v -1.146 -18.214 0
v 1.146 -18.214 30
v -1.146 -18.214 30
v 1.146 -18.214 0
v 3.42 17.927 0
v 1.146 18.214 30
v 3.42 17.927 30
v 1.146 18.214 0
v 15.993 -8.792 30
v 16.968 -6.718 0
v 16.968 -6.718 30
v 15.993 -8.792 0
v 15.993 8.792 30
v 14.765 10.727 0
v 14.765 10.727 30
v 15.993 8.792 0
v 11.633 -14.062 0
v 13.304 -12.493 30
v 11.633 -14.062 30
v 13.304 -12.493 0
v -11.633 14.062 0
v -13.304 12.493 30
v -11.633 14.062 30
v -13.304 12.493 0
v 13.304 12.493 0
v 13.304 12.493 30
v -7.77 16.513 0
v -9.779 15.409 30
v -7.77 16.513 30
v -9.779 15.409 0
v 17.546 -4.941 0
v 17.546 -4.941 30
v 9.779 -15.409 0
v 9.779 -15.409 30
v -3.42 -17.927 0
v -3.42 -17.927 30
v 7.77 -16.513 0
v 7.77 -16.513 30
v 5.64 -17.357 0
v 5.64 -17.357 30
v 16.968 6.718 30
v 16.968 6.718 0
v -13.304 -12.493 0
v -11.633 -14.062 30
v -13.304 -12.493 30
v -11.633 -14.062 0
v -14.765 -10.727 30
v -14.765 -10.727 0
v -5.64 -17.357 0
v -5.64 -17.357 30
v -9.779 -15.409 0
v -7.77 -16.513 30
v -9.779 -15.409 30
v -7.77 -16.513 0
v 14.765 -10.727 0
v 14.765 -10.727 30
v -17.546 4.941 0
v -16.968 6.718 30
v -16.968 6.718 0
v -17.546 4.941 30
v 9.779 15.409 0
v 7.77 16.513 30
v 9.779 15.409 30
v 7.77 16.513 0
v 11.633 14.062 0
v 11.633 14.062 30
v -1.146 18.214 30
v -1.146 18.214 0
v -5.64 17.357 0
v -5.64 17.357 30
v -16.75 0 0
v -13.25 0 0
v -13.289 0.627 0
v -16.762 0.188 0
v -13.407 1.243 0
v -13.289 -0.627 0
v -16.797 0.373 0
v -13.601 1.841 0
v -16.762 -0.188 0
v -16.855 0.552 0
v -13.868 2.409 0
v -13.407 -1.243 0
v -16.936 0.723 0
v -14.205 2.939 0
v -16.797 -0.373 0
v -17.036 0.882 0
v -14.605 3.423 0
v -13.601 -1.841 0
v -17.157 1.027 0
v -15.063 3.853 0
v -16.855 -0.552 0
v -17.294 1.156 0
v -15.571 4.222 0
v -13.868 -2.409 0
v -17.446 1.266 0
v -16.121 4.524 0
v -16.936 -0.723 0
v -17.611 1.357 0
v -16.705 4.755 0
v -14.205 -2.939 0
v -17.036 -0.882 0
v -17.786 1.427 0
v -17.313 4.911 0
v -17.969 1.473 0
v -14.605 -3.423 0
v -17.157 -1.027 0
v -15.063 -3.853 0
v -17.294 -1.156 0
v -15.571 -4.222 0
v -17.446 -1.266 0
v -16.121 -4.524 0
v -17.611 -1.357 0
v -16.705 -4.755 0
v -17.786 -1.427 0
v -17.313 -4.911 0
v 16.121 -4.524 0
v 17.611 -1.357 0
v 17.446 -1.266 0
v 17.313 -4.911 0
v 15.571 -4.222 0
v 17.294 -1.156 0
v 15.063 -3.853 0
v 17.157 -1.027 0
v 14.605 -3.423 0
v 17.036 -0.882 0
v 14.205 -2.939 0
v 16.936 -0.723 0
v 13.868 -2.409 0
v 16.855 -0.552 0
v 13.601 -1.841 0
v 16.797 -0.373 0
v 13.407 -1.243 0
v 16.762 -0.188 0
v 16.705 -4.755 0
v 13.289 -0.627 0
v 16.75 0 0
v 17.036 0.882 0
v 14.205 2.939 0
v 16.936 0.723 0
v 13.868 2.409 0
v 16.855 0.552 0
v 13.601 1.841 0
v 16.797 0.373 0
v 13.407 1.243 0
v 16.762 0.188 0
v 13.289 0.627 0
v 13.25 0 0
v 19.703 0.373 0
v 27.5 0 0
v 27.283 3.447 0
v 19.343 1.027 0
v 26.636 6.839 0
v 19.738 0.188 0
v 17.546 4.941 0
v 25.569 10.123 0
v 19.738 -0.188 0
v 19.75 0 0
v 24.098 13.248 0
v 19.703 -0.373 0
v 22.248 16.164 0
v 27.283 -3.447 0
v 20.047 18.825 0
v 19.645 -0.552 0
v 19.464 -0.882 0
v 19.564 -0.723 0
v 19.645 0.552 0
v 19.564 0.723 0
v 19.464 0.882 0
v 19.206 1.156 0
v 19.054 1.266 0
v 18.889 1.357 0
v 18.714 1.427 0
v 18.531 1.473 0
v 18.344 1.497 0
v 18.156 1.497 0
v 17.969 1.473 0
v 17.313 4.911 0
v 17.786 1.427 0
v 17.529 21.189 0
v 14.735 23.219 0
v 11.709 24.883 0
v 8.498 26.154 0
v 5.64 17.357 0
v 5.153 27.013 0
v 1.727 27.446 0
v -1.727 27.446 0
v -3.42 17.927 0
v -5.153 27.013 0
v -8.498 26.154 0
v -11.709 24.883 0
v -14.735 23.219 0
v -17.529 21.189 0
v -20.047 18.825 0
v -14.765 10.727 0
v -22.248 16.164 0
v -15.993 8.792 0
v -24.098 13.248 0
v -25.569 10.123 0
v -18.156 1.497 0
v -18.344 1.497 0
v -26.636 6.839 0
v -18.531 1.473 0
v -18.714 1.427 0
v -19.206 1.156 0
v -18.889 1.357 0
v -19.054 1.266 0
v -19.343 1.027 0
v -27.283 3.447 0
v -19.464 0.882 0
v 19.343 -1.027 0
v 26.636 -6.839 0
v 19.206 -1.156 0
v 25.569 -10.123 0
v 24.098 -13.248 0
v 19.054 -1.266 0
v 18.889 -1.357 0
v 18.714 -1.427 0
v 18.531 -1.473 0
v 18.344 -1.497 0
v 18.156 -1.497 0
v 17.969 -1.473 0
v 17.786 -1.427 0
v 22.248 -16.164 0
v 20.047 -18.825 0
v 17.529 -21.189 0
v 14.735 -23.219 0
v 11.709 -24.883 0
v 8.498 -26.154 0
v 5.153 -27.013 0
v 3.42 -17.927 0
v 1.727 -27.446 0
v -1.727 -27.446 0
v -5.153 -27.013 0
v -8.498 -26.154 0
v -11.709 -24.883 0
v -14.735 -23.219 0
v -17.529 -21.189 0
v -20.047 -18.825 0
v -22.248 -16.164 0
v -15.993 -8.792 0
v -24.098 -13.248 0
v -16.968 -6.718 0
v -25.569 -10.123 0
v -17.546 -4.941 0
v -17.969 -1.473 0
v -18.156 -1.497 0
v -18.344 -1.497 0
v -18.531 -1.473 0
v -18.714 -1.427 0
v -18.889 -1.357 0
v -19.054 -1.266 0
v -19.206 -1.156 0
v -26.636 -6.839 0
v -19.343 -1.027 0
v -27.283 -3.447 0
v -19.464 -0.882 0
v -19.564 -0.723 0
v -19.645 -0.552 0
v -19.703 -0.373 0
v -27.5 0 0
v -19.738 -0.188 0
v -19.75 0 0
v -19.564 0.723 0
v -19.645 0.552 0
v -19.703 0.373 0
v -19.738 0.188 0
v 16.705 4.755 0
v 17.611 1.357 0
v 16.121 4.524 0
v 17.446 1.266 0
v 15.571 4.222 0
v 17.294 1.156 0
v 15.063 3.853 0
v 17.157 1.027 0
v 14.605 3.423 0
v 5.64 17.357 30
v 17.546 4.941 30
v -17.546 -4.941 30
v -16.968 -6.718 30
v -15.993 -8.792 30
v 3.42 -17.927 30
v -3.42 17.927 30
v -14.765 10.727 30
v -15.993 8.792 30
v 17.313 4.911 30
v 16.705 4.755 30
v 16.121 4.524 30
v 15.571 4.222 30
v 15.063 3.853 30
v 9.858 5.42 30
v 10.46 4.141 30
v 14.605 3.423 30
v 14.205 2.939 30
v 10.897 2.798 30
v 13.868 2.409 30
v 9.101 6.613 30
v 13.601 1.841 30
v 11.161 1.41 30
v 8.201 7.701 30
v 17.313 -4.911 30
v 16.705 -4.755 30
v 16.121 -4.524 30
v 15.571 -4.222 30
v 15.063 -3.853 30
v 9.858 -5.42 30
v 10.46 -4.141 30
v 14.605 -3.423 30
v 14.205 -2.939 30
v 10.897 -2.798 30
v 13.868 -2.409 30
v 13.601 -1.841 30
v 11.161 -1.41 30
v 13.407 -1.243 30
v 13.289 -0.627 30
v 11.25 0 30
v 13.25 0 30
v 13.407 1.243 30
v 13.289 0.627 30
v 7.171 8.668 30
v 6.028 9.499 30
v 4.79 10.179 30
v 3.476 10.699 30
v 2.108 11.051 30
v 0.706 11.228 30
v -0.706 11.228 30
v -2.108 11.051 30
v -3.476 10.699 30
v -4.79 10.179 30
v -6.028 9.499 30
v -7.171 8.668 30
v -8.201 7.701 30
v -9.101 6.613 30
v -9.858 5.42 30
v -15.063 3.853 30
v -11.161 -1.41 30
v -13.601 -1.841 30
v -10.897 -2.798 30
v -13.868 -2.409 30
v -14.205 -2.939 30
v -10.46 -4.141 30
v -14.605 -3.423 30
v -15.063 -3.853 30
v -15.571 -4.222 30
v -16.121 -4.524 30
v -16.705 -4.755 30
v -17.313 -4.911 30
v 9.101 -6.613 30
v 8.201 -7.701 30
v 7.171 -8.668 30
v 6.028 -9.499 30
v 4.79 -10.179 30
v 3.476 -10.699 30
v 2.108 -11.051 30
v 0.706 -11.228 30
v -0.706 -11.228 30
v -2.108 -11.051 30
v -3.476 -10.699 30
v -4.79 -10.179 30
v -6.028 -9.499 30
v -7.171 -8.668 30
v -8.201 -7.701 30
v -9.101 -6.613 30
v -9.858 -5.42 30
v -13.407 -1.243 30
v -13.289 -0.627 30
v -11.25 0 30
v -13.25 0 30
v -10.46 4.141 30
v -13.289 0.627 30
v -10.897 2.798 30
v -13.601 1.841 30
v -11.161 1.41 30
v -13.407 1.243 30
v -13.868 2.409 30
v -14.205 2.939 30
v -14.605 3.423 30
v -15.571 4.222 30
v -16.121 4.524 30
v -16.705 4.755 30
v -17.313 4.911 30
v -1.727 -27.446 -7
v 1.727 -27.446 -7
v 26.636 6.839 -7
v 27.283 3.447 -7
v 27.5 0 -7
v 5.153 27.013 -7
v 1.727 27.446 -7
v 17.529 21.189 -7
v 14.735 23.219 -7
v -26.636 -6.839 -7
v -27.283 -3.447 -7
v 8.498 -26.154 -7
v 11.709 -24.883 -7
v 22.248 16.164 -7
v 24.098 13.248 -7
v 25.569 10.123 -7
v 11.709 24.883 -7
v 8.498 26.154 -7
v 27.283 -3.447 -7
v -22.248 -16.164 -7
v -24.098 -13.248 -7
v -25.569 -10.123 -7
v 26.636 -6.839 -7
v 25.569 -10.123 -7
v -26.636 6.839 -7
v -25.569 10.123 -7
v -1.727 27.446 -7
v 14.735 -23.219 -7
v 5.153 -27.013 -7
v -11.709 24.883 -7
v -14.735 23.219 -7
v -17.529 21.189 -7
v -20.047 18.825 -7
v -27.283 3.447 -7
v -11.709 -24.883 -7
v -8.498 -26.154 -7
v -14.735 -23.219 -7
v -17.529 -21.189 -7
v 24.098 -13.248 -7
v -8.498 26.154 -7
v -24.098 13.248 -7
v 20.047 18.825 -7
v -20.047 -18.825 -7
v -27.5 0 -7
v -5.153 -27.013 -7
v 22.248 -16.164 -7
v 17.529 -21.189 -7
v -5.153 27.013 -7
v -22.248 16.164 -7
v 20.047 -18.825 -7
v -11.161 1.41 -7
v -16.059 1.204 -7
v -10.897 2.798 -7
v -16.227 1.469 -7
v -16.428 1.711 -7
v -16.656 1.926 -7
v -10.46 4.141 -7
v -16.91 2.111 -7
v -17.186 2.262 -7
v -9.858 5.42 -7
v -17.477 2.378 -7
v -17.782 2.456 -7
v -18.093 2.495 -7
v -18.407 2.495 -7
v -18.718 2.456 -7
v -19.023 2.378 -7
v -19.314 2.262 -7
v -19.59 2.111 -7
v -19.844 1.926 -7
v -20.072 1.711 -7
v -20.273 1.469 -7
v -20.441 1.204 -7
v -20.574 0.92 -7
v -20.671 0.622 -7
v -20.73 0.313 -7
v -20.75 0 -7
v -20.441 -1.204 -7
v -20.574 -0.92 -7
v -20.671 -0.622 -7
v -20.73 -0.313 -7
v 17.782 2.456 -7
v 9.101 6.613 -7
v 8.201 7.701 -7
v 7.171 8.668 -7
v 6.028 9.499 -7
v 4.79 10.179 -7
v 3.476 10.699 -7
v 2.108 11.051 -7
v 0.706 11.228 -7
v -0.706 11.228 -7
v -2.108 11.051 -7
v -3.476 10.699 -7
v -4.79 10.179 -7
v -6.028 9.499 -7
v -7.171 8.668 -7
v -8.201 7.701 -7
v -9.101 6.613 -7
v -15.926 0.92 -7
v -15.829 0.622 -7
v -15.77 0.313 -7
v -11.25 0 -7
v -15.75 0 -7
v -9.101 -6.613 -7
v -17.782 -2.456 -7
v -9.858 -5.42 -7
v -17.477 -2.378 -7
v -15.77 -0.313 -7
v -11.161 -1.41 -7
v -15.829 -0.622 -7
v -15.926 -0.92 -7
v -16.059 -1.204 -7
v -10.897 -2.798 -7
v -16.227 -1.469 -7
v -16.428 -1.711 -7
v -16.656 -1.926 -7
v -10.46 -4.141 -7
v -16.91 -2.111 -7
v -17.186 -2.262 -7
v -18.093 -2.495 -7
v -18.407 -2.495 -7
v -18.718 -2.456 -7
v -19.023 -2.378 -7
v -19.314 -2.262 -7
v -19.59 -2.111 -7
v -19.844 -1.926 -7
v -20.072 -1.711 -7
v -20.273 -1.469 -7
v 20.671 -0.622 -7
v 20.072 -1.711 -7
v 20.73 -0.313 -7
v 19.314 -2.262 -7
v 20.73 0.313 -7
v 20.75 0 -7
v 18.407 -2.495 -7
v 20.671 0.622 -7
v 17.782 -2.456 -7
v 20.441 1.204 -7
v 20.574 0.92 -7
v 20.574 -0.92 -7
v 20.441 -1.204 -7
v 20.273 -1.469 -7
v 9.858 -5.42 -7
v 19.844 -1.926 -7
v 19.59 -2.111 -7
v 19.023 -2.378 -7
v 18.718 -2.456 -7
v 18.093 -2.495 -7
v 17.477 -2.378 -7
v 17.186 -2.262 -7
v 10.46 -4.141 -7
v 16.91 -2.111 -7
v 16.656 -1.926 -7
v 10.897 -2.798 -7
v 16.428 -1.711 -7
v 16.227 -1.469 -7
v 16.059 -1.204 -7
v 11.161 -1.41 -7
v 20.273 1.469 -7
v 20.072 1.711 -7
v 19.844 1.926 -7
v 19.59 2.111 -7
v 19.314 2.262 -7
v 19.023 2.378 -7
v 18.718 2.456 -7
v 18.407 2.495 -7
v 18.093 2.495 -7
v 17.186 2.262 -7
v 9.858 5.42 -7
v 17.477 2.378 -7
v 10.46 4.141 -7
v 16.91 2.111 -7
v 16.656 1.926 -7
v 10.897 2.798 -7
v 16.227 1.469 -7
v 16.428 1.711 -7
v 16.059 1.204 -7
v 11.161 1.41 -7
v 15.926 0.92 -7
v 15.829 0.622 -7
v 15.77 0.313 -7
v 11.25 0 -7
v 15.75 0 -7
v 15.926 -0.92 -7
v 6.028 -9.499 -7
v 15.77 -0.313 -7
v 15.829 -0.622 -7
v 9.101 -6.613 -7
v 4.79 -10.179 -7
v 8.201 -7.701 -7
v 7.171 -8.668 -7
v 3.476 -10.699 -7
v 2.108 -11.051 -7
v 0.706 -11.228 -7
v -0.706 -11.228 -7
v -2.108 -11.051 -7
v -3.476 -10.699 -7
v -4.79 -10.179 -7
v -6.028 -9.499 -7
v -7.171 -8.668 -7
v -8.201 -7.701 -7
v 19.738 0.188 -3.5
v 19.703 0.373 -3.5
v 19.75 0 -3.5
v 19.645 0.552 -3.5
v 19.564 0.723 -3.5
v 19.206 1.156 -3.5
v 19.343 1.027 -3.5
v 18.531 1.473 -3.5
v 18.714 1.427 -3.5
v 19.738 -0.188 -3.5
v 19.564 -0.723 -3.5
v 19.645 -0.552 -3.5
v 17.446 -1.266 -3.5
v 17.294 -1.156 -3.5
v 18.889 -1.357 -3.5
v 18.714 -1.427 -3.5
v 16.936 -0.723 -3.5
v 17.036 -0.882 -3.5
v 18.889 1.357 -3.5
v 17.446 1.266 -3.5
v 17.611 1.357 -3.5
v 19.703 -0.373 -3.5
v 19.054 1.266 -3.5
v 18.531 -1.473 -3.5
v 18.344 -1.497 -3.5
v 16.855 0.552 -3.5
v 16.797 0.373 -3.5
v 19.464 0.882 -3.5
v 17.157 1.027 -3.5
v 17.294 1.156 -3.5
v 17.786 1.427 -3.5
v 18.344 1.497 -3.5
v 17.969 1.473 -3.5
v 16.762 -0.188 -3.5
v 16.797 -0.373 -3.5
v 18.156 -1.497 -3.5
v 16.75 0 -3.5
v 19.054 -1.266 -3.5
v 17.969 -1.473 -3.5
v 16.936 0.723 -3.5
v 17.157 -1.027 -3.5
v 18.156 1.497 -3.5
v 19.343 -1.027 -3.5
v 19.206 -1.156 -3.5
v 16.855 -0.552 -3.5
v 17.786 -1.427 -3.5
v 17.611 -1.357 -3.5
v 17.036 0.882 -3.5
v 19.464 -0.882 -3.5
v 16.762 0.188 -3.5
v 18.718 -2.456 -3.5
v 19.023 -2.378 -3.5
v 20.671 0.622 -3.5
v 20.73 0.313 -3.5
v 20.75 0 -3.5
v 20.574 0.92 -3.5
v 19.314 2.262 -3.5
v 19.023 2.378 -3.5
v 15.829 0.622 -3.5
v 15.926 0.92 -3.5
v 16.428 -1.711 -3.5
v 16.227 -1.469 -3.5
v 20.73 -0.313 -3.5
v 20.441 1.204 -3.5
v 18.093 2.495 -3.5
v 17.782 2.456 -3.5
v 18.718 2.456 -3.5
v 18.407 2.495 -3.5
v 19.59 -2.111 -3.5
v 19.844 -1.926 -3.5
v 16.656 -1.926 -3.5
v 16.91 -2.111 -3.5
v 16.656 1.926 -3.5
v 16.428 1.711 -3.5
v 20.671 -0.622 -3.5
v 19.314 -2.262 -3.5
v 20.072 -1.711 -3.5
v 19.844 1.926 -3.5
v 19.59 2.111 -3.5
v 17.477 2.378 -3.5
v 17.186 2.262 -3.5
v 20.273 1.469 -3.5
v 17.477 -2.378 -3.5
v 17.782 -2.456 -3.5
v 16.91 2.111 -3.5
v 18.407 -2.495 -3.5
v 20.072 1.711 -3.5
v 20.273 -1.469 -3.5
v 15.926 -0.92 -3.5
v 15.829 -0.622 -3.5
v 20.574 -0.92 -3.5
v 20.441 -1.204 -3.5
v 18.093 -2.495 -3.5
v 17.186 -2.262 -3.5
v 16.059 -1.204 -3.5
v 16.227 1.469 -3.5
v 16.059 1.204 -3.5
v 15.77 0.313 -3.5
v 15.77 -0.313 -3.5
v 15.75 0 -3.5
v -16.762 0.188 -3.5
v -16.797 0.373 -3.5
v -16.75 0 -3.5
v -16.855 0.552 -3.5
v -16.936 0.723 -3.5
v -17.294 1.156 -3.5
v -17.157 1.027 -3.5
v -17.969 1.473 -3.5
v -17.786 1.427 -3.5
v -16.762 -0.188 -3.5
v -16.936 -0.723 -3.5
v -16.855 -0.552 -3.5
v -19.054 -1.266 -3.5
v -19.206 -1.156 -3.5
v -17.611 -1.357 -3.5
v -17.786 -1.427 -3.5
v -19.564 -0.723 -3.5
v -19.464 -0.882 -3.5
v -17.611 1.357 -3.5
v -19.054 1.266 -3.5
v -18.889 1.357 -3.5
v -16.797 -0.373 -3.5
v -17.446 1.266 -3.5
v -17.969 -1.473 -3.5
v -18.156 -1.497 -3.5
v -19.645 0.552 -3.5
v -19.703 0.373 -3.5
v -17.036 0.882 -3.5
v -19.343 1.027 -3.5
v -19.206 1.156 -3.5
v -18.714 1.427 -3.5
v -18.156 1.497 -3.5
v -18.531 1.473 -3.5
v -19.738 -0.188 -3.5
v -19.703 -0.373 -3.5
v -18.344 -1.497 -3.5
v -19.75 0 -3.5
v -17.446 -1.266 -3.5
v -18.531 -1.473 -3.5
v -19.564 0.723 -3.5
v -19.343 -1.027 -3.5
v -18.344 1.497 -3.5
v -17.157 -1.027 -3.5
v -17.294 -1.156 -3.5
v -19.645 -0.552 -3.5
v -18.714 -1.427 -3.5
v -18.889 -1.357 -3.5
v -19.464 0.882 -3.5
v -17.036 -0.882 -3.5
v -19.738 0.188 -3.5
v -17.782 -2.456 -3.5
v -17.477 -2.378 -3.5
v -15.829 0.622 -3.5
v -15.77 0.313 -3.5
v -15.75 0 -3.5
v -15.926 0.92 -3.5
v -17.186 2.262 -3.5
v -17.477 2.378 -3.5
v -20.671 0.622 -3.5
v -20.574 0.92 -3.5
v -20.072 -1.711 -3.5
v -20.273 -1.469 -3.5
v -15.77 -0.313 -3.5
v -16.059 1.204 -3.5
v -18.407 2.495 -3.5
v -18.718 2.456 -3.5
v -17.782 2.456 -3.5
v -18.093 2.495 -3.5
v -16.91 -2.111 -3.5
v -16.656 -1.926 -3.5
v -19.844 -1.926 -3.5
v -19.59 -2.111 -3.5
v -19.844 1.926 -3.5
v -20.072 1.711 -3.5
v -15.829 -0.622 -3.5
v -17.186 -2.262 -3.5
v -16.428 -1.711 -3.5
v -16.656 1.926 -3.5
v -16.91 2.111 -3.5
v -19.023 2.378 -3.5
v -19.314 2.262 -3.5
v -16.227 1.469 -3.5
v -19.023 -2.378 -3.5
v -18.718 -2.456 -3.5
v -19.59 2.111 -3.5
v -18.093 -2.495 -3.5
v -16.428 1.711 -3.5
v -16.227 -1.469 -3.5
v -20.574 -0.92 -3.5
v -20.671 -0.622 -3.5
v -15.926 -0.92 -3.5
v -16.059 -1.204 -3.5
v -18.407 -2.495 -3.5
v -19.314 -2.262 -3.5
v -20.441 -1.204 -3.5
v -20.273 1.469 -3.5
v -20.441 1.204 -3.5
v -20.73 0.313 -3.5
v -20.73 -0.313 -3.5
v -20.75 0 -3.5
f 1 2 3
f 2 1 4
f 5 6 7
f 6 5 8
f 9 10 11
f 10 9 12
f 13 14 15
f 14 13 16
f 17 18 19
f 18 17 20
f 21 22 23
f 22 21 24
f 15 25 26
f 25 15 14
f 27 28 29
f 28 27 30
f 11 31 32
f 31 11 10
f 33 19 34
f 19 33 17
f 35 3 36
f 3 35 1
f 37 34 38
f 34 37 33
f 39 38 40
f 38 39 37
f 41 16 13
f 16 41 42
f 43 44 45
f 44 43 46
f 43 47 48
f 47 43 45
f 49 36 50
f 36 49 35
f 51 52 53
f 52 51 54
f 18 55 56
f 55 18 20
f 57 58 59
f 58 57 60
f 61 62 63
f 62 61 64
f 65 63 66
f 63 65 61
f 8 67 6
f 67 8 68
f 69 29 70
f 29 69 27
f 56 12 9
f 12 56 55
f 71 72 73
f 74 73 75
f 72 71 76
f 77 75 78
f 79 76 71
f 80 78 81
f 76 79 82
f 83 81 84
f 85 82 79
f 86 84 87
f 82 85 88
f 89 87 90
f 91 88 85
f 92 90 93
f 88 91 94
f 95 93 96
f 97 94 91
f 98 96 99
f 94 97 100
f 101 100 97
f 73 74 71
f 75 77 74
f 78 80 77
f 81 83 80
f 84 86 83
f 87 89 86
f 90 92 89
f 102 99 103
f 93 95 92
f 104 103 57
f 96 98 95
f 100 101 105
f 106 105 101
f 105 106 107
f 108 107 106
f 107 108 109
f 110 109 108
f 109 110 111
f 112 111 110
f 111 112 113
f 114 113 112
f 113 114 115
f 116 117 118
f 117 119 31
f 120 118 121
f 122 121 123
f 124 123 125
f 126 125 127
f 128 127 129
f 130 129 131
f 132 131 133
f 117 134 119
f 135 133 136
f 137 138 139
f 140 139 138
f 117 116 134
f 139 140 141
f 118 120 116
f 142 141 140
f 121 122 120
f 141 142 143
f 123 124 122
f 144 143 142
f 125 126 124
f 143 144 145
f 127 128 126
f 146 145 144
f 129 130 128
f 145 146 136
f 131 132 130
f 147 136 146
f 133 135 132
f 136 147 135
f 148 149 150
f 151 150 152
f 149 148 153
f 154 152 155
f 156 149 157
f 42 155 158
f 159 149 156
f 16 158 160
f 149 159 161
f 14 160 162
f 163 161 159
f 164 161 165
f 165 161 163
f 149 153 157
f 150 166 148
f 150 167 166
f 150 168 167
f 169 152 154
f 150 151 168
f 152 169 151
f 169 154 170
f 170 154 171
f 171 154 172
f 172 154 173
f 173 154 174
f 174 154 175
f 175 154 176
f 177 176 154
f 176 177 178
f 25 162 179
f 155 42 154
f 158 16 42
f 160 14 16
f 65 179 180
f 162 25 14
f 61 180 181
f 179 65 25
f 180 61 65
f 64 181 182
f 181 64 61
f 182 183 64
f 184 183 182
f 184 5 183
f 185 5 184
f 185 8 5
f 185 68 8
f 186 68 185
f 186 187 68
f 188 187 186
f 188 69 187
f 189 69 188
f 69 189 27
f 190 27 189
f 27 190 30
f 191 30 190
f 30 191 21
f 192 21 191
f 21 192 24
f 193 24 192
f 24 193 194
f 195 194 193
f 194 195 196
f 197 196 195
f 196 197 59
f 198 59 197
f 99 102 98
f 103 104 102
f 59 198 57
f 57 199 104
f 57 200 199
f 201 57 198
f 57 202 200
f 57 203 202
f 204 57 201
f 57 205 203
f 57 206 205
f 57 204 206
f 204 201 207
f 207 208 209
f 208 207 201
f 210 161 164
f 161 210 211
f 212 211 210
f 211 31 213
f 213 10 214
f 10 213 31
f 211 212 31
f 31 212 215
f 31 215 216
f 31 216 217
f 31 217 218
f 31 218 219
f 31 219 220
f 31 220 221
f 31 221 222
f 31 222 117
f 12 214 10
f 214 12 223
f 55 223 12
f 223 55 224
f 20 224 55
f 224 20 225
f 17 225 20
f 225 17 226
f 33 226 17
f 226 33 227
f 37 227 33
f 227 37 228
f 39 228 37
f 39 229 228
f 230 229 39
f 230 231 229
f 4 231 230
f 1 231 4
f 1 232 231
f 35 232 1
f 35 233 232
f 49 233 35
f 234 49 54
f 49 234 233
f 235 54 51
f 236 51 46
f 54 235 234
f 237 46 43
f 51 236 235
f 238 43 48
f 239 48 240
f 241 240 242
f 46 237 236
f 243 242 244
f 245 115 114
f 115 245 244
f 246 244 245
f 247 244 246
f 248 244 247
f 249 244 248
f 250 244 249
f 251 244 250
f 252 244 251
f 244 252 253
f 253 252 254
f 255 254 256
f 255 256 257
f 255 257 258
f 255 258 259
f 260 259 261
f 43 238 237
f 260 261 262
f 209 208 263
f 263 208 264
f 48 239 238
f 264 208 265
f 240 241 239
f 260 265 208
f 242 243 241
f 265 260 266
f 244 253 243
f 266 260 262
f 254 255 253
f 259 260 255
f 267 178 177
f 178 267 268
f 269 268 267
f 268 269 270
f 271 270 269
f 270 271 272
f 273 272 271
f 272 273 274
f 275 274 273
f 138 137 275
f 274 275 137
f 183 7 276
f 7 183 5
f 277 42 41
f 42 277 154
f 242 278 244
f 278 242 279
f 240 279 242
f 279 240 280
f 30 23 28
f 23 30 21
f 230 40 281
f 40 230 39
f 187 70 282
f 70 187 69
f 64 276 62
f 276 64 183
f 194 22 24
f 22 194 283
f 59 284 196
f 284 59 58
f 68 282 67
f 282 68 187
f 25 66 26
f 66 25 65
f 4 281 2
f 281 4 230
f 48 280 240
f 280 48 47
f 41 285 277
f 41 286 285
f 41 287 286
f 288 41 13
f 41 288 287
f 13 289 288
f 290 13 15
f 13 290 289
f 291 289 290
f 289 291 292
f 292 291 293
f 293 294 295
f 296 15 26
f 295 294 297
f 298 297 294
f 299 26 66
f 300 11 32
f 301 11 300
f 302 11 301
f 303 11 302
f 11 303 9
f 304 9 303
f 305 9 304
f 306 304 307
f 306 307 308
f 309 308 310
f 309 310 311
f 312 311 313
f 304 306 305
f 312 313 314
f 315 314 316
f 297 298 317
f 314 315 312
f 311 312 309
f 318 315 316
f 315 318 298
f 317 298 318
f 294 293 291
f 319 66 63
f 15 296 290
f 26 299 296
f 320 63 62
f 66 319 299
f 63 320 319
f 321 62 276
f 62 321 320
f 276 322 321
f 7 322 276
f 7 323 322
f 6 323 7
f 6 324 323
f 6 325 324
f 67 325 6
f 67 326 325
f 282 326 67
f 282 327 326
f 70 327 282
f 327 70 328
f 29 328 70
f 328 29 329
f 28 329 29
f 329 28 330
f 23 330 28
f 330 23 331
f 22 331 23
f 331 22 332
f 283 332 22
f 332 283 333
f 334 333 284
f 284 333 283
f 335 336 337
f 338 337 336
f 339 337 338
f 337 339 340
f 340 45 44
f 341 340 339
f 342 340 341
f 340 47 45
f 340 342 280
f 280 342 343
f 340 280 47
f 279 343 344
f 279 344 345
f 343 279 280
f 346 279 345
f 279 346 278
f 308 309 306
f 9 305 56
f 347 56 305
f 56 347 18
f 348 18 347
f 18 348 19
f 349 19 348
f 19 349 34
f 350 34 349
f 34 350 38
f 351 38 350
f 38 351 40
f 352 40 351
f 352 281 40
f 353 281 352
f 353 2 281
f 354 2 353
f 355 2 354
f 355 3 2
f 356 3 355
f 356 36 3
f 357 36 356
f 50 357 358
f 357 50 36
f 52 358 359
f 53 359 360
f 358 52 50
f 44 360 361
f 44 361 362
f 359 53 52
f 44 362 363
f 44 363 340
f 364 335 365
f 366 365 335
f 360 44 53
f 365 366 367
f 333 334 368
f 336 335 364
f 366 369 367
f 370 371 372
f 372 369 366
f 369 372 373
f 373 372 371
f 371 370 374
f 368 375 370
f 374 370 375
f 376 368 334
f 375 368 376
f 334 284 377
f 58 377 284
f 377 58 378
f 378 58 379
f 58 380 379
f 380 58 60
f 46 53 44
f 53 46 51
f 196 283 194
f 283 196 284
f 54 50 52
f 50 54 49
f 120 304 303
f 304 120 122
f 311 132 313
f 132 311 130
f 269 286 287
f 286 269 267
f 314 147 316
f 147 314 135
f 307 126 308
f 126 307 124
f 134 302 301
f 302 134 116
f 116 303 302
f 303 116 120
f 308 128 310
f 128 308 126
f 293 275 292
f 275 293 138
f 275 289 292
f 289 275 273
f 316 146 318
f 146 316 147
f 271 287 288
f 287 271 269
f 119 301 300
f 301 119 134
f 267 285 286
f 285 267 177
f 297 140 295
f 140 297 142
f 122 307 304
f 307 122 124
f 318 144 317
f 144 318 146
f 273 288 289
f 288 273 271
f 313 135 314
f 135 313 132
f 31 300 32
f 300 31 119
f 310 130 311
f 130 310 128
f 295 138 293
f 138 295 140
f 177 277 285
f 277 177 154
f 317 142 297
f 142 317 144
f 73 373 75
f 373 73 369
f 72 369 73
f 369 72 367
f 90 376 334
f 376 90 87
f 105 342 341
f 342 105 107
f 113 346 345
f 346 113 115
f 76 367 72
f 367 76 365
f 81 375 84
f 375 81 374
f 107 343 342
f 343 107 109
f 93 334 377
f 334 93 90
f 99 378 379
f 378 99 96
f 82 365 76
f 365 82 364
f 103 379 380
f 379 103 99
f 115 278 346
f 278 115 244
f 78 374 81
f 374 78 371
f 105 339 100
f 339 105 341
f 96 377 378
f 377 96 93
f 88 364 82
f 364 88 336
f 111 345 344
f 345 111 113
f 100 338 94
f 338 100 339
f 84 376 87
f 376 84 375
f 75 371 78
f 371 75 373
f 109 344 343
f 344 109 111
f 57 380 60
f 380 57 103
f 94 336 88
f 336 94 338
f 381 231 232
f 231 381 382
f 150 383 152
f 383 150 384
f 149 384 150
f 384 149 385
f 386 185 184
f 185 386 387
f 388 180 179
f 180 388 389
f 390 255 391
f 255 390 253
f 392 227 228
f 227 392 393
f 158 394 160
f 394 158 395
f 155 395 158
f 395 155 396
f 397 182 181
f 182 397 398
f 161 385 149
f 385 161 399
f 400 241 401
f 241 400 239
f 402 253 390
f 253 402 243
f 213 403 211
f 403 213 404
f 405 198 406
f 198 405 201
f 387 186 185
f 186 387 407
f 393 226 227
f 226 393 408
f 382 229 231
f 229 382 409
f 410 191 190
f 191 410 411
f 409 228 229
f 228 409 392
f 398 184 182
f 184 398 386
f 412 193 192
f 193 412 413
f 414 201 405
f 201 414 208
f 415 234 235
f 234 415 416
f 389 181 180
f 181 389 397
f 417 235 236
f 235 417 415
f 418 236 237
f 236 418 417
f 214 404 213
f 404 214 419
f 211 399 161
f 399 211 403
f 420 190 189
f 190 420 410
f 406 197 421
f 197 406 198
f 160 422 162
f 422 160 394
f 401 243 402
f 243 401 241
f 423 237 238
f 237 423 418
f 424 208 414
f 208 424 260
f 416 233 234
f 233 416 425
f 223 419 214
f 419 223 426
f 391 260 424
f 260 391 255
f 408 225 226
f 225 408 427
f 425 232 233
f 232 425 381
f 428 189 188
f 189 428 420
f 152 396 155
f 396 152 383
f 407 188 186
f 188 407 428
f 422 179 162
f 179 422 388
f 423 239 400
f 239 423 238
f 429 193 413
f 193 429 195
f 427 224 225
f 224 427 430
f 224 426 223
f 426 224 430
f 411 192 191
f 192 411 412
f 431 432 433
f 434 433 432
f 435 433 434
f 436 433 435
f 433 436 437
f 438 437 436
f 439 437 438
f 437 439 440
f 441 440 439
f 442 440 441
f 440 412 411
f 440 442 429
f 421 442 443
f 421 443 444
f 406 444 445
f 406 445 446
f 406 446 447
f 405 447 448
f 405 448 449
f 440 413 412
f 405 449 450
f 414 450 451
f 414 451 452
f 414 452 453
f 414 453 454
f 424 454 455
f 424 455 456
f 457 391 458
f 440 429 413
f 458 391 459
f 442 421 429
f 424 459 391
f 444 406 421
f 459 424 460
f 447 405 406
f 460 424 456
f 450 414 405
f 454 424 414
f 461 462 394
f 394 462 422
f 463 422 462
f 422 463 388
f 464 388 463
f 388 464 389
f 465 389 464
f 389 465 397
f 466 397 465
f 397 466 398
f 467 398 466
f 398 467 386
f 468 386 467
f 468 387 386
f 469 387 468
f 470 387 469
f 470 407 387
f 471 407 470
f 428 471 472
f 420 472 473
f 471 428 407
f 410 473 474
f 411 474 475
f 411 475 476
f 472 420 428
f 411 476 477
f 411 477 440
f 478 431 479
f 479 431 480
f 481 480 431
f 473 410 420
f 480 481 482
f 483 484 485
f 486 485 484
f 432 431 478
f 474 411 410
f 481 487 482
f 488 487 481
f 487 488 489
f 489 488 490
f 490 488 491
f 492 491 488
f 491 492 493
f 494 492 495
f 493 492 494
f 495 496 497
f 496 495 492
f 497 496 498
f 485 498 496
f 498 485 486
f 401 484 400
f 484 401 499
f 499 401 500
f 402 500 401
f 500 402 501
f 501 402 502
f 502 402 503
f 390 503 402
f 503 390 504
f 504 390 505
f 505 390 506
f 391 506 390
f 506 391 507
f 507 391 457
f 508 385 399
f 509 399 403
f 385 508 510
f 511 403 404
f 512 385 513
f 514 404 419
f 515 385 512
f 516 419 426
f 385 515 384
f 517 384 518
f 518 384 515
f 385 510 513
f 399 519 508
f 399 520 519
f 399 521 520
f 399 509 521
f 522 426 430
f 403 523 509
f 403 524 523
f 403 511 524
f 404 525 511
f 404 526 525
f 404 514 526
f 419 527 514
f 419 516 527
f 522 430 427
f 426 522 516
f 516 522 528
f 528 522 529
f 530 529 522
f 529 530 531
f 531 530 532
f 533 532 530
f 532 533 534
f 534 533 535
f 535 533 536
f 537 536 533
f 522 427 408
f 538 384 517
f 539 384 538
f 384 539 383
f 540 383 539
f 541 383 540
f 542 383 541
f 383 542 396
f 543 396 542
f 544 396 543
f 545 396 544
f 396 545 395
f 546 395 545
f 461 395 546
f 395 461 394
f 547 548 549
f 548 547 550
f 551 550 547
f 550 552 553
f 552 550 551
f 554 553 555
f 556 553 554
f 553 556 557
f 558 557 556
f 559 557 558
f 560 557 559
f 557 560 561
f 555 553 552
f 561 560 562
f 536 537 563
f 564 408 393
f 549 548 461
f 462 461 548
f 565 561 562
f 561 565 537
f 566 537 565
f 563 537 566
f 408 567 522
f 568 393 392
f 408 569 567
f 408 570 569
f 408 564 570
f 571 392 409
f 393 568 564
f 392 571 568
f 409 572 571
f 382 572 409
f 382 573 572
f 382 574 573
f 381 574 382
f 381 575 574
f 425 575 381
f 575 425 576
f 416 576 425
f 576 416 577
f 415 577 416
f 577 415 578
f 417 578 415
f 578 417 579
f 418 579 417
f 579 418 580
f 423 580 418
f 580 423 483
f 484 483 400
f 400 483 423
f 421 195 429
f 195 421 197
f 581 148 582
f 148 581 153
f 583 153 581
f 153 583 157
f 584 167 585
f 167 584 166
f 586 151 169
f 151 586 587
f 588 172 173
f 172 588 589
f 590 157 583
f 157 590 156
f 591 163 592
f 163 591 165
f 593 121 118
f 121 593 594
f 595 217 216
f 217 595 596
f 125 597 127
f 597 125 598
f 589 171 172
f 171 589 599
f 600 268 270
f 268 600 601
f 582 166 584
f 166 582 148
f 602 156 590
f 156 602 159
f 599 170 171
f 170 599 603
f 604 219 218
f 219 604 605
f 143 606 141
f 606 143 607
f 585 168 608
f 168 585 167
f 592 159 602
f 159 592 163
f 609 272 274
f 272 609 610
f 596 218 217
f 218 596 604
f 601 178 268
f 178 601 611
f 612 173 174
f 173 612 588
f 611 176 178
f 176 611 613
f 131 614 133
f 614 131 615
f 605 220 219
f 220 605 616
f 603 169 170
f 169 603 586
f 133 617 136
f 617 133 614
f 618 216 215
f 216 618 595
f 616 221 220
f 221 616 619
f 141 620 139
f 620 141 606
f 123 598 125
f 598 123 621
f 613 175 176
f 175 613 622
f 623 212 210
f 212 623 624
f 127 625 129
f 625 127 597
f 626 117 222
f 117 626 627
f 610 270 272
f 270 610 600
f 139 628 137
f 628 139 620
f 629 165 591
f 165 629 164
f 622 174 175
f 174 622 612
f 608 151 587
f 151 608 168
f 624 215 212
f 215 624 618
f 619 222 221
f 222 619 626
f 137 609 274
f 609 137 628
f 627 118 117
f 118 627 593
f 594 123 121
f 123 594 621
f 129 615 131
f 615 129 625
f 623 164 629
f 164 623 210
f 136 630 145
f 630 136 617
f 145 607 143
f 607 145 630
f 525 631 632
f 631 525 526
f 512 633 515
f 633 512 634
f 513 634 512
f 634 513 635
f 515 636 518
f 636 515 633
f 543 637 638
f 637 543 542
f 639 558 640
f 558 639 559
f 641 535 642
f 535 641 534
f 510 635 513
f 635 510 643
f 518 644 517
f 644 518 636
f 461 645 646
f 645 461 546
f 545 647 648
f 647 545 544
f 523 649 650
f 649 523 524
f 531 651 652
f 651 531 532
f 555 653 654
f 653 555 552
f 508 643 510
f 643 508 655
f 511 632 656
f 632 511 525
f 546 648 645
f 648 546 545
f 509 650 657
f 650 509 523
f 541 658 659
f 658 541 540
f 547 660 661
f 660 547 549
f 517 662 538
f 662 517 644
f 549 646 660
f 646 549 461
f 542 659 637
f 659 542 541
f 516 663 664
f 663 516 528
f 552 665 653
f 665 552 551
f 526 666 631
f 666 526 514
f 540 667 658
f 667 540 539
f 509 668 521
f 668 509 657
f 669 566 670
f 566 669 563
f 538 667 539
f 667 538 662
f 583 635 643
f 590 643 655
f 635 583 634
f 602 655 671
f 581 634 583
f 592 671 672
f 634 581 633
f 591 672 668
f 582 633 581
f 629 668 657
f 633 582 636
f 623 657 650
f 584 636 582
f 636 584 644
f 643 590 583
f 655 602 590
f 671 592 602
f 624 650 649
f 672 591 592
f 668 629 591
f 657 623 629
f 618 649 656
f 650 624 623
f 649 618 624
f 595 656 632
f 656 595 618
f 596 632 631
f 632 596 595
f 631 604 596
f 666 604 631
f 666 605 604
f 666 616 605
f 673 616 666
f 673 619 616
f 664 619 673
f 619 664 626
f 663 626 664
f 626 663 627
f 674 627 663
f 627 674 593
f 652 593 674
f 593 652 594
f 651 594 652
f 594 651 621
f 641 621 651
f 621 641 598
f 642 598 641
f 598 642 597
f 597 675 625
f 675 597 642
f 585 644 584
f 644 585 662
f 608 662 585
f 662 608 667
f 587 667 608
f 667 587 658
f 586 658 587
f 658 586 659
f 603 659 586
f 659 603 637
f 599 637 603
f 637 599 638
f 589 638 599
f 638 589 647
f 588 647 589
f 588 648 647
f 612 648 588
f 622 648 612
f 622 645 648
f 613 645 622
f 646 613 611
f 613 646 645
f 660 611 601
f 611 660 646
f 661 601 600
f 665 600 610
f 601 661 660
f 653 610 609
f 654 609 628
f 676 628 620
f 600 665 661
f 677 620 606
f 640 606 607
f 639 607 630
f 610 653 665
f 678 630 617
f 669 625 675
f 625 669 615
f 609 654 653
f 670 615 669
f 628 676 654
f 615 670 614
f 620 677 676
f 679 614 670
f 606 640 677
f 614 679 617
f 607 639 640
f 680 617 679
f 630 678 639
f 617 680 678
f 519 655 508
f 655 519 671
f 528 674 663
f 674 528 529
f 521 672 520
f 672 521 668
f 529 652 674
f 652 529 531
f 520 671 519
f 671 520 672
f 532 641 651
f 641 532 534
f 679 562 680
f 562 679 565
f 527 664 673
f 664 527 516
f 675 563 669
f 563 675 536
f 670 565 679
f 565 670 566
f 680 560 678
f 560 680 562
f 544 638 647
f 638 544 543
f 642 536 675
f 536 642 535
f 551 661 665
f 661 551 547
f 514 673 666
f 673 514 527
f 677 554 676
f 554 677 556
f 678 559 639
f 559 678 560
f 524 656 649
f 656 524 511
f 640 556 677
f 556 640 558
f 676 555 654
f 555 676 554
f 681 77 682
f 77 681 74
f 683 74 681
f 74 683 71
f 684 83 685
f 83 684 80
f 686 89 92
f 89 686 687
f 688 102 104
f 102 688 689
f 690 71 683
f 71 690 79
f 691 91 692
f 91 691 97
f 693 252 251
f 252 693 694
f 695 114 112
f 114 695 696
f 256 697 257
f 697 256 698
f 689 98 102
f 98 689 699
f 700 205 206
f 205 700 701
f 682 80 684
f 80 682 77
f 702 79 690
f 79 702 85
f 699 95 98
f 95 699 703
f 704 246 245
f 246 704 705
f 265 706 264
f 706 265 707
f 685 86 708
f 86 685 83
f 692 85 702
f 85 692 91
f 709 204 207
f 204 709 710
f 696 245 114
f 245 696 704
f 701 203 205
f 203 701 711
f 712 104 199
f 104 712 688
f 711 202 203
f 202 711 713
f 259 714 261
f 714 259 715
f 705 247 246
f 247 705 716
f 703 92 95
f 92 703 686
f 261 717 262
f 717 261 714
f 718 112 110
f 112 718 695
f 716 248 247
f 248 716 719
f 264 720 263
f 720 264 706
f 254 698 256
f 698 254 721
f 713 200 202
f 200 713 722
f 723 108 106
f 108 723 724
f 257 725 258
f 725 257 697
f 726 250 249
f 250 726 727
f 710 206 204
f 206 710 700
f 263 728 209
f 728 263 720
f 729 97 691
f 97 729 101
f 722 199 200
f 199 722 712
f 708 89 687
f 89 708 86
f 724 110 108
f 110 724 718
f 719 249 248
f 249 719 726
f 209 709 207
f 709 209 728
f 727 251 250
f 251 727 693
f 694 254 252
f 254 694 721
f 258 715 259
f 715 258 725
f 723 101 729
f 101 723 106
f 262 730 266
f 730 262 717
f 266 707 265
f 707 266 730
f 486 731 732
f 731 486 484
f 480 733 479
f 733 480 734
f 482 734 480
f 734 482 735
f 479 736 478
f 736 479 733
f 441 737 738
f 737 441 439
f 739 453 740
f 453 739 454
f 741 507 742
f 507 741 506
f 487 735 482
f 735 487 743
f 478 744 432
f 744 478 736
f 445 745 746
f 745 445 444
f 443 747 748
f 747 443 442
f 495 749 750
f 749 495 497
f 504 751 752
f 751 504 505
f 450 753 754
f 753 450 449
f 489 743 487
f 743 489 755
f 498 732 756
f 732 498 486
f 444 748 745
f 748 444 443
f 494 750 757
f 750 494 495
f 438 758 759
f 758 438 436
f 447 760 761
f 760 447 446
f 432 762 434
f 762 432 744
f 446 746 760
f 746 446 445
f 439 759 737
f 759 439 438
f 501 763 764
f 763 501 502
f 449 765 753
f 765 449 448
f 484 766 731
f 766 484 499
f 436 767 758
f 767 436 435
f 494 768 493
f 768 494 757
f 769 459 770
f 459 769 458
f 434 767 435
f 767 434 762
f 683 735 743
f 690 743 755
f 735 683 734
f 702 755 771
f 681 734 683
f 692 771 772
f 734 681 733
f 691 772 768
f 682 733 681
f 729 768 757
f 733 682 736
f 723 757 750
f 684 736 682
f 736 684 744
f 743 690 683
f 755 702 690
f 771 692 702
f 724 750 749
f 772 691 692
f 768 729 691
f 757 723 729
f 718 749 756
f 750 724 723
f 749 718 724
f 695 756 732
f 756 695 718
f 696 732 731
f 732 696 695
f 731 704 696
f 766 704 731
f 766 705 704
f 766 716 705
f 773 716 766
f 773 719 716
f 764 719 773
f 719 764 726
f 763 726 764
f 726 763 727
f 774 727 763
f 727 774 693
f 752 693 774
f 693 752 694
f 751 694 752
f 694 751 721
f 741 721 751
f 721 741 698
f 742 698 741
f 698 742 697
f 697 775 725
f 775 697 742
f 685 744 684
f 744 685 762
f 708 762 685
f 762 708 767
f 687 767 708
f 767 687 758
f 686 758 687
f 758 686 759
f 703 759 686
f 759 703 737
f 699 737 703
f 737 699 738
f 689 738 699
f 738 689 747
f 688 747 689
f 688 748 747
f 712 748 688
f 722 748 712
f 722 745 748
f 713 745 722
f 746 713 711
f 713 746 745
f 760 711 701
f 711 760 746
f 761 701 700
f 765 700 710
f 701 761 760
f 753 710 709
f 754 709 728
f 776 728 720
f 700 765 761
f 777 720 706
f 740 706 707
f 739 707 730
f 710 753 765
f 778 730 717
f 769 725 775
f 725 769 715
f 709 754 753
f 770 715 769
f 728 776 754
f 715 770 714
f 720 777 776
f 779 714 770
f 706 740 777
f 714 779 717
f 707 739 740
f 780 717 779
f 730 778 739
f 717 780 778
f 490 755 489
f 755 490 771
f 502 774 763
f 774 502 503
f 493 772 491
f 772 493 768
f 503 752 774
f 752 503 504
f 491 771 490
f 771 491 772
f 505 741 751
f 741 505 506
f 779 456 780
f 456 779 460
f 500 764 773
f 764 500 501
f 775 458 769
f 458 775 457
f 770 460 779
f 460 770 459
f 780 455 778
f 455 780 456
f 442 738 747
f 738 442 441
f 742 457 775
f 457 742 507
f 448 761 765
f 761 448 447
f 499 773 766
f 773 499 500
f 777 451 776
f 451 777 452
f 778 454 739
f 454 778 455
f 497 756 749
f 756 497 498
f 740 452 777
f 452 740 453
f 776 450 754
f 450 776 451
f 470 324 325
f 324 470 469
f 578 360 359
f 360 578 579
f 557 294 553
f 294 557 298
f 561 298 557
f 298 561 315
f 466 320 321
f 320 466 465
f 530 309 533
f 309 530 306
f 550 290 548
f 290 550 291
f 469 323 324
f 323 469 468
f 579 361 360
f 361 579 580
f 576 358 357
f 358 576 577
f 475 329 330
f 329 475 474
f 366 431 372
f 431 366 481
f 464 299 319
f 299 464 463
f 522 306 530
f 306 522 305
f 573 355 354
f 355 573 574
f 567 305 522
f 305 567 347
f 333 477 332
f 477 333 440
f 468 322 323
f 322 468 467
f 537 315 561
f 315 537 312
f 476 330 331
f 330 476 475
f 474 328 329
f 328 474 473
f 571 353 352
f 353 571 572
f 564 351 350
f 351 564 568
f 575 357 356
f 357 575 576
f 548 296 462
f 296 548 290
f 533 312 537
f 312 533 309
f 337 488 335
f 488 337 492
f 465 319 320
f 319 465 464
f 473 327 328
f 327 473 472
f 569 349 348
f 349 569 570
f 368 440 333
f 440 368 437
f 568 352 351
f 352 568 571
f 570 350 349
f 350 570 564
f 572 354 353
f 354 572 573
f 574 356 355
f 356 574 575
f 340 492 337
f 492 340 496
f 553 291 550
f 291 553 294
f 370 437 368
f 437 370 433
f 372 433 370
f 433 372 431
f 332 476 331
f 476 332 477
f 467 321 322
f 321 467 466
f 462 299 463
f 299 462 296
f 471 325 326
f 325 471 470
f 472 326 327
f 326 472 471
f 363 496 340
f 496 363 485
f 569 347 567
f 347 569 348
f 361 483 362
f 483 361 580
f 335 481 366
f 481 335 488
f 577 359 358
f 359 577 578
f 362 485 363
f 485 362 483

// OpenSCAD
handlebar_diameter=22.5;
base_diameter=55;
base_width=7;
slidebase_width=30;
slidebase_min_thickness=2;
flask_diameter=10;
wire_diameter=3;
wire_base_diameter=5;
$fn=50;

slidebase_diameter=handlebar_diameter+2*slidebase_min_thickness+flask_diameter;

difference() {
union() {
translate([0,0,-base_width])
cylinder(base_width, r=base_diameter/2, center = false);

difference() {  
    cylinder(slidebase_width, r=slidebase_diameter/2, center = false);

    translate([slidebase_diameter/2,0,-1])
    cylinder(slidebase_width+2, r=flask_diameter/2, center = false);
    
        translate([-slidebase_diameter/2,0,-1])
    cylinder(slidebase_width+2, r=flask_diameter/2, center = false);
}
}

translate([slidebase_diameter/2,0,0]) union() {
    cylinder(2*slidebase_width+1, r=wire_diameter/2, center = true);
    
    translate([0,0,-base_width-1])
    cylinder(base_width/2+1, r=wire_base_diameter/2, center=false);
}
    
translate([-slidebase_diameter/2,0,0]) union() {
    cylinder(2*slidebase_width+1, r=wire_diameter/2, center = true);    
  
    translate([0,0,-base_width-1])  
    cylinder(base_width/2+1, r=wire_base_diameter/2, center=false);  
}


cylinder(slidebase_width*2+1, r=handlebar_diameter/2, center = true);
}
